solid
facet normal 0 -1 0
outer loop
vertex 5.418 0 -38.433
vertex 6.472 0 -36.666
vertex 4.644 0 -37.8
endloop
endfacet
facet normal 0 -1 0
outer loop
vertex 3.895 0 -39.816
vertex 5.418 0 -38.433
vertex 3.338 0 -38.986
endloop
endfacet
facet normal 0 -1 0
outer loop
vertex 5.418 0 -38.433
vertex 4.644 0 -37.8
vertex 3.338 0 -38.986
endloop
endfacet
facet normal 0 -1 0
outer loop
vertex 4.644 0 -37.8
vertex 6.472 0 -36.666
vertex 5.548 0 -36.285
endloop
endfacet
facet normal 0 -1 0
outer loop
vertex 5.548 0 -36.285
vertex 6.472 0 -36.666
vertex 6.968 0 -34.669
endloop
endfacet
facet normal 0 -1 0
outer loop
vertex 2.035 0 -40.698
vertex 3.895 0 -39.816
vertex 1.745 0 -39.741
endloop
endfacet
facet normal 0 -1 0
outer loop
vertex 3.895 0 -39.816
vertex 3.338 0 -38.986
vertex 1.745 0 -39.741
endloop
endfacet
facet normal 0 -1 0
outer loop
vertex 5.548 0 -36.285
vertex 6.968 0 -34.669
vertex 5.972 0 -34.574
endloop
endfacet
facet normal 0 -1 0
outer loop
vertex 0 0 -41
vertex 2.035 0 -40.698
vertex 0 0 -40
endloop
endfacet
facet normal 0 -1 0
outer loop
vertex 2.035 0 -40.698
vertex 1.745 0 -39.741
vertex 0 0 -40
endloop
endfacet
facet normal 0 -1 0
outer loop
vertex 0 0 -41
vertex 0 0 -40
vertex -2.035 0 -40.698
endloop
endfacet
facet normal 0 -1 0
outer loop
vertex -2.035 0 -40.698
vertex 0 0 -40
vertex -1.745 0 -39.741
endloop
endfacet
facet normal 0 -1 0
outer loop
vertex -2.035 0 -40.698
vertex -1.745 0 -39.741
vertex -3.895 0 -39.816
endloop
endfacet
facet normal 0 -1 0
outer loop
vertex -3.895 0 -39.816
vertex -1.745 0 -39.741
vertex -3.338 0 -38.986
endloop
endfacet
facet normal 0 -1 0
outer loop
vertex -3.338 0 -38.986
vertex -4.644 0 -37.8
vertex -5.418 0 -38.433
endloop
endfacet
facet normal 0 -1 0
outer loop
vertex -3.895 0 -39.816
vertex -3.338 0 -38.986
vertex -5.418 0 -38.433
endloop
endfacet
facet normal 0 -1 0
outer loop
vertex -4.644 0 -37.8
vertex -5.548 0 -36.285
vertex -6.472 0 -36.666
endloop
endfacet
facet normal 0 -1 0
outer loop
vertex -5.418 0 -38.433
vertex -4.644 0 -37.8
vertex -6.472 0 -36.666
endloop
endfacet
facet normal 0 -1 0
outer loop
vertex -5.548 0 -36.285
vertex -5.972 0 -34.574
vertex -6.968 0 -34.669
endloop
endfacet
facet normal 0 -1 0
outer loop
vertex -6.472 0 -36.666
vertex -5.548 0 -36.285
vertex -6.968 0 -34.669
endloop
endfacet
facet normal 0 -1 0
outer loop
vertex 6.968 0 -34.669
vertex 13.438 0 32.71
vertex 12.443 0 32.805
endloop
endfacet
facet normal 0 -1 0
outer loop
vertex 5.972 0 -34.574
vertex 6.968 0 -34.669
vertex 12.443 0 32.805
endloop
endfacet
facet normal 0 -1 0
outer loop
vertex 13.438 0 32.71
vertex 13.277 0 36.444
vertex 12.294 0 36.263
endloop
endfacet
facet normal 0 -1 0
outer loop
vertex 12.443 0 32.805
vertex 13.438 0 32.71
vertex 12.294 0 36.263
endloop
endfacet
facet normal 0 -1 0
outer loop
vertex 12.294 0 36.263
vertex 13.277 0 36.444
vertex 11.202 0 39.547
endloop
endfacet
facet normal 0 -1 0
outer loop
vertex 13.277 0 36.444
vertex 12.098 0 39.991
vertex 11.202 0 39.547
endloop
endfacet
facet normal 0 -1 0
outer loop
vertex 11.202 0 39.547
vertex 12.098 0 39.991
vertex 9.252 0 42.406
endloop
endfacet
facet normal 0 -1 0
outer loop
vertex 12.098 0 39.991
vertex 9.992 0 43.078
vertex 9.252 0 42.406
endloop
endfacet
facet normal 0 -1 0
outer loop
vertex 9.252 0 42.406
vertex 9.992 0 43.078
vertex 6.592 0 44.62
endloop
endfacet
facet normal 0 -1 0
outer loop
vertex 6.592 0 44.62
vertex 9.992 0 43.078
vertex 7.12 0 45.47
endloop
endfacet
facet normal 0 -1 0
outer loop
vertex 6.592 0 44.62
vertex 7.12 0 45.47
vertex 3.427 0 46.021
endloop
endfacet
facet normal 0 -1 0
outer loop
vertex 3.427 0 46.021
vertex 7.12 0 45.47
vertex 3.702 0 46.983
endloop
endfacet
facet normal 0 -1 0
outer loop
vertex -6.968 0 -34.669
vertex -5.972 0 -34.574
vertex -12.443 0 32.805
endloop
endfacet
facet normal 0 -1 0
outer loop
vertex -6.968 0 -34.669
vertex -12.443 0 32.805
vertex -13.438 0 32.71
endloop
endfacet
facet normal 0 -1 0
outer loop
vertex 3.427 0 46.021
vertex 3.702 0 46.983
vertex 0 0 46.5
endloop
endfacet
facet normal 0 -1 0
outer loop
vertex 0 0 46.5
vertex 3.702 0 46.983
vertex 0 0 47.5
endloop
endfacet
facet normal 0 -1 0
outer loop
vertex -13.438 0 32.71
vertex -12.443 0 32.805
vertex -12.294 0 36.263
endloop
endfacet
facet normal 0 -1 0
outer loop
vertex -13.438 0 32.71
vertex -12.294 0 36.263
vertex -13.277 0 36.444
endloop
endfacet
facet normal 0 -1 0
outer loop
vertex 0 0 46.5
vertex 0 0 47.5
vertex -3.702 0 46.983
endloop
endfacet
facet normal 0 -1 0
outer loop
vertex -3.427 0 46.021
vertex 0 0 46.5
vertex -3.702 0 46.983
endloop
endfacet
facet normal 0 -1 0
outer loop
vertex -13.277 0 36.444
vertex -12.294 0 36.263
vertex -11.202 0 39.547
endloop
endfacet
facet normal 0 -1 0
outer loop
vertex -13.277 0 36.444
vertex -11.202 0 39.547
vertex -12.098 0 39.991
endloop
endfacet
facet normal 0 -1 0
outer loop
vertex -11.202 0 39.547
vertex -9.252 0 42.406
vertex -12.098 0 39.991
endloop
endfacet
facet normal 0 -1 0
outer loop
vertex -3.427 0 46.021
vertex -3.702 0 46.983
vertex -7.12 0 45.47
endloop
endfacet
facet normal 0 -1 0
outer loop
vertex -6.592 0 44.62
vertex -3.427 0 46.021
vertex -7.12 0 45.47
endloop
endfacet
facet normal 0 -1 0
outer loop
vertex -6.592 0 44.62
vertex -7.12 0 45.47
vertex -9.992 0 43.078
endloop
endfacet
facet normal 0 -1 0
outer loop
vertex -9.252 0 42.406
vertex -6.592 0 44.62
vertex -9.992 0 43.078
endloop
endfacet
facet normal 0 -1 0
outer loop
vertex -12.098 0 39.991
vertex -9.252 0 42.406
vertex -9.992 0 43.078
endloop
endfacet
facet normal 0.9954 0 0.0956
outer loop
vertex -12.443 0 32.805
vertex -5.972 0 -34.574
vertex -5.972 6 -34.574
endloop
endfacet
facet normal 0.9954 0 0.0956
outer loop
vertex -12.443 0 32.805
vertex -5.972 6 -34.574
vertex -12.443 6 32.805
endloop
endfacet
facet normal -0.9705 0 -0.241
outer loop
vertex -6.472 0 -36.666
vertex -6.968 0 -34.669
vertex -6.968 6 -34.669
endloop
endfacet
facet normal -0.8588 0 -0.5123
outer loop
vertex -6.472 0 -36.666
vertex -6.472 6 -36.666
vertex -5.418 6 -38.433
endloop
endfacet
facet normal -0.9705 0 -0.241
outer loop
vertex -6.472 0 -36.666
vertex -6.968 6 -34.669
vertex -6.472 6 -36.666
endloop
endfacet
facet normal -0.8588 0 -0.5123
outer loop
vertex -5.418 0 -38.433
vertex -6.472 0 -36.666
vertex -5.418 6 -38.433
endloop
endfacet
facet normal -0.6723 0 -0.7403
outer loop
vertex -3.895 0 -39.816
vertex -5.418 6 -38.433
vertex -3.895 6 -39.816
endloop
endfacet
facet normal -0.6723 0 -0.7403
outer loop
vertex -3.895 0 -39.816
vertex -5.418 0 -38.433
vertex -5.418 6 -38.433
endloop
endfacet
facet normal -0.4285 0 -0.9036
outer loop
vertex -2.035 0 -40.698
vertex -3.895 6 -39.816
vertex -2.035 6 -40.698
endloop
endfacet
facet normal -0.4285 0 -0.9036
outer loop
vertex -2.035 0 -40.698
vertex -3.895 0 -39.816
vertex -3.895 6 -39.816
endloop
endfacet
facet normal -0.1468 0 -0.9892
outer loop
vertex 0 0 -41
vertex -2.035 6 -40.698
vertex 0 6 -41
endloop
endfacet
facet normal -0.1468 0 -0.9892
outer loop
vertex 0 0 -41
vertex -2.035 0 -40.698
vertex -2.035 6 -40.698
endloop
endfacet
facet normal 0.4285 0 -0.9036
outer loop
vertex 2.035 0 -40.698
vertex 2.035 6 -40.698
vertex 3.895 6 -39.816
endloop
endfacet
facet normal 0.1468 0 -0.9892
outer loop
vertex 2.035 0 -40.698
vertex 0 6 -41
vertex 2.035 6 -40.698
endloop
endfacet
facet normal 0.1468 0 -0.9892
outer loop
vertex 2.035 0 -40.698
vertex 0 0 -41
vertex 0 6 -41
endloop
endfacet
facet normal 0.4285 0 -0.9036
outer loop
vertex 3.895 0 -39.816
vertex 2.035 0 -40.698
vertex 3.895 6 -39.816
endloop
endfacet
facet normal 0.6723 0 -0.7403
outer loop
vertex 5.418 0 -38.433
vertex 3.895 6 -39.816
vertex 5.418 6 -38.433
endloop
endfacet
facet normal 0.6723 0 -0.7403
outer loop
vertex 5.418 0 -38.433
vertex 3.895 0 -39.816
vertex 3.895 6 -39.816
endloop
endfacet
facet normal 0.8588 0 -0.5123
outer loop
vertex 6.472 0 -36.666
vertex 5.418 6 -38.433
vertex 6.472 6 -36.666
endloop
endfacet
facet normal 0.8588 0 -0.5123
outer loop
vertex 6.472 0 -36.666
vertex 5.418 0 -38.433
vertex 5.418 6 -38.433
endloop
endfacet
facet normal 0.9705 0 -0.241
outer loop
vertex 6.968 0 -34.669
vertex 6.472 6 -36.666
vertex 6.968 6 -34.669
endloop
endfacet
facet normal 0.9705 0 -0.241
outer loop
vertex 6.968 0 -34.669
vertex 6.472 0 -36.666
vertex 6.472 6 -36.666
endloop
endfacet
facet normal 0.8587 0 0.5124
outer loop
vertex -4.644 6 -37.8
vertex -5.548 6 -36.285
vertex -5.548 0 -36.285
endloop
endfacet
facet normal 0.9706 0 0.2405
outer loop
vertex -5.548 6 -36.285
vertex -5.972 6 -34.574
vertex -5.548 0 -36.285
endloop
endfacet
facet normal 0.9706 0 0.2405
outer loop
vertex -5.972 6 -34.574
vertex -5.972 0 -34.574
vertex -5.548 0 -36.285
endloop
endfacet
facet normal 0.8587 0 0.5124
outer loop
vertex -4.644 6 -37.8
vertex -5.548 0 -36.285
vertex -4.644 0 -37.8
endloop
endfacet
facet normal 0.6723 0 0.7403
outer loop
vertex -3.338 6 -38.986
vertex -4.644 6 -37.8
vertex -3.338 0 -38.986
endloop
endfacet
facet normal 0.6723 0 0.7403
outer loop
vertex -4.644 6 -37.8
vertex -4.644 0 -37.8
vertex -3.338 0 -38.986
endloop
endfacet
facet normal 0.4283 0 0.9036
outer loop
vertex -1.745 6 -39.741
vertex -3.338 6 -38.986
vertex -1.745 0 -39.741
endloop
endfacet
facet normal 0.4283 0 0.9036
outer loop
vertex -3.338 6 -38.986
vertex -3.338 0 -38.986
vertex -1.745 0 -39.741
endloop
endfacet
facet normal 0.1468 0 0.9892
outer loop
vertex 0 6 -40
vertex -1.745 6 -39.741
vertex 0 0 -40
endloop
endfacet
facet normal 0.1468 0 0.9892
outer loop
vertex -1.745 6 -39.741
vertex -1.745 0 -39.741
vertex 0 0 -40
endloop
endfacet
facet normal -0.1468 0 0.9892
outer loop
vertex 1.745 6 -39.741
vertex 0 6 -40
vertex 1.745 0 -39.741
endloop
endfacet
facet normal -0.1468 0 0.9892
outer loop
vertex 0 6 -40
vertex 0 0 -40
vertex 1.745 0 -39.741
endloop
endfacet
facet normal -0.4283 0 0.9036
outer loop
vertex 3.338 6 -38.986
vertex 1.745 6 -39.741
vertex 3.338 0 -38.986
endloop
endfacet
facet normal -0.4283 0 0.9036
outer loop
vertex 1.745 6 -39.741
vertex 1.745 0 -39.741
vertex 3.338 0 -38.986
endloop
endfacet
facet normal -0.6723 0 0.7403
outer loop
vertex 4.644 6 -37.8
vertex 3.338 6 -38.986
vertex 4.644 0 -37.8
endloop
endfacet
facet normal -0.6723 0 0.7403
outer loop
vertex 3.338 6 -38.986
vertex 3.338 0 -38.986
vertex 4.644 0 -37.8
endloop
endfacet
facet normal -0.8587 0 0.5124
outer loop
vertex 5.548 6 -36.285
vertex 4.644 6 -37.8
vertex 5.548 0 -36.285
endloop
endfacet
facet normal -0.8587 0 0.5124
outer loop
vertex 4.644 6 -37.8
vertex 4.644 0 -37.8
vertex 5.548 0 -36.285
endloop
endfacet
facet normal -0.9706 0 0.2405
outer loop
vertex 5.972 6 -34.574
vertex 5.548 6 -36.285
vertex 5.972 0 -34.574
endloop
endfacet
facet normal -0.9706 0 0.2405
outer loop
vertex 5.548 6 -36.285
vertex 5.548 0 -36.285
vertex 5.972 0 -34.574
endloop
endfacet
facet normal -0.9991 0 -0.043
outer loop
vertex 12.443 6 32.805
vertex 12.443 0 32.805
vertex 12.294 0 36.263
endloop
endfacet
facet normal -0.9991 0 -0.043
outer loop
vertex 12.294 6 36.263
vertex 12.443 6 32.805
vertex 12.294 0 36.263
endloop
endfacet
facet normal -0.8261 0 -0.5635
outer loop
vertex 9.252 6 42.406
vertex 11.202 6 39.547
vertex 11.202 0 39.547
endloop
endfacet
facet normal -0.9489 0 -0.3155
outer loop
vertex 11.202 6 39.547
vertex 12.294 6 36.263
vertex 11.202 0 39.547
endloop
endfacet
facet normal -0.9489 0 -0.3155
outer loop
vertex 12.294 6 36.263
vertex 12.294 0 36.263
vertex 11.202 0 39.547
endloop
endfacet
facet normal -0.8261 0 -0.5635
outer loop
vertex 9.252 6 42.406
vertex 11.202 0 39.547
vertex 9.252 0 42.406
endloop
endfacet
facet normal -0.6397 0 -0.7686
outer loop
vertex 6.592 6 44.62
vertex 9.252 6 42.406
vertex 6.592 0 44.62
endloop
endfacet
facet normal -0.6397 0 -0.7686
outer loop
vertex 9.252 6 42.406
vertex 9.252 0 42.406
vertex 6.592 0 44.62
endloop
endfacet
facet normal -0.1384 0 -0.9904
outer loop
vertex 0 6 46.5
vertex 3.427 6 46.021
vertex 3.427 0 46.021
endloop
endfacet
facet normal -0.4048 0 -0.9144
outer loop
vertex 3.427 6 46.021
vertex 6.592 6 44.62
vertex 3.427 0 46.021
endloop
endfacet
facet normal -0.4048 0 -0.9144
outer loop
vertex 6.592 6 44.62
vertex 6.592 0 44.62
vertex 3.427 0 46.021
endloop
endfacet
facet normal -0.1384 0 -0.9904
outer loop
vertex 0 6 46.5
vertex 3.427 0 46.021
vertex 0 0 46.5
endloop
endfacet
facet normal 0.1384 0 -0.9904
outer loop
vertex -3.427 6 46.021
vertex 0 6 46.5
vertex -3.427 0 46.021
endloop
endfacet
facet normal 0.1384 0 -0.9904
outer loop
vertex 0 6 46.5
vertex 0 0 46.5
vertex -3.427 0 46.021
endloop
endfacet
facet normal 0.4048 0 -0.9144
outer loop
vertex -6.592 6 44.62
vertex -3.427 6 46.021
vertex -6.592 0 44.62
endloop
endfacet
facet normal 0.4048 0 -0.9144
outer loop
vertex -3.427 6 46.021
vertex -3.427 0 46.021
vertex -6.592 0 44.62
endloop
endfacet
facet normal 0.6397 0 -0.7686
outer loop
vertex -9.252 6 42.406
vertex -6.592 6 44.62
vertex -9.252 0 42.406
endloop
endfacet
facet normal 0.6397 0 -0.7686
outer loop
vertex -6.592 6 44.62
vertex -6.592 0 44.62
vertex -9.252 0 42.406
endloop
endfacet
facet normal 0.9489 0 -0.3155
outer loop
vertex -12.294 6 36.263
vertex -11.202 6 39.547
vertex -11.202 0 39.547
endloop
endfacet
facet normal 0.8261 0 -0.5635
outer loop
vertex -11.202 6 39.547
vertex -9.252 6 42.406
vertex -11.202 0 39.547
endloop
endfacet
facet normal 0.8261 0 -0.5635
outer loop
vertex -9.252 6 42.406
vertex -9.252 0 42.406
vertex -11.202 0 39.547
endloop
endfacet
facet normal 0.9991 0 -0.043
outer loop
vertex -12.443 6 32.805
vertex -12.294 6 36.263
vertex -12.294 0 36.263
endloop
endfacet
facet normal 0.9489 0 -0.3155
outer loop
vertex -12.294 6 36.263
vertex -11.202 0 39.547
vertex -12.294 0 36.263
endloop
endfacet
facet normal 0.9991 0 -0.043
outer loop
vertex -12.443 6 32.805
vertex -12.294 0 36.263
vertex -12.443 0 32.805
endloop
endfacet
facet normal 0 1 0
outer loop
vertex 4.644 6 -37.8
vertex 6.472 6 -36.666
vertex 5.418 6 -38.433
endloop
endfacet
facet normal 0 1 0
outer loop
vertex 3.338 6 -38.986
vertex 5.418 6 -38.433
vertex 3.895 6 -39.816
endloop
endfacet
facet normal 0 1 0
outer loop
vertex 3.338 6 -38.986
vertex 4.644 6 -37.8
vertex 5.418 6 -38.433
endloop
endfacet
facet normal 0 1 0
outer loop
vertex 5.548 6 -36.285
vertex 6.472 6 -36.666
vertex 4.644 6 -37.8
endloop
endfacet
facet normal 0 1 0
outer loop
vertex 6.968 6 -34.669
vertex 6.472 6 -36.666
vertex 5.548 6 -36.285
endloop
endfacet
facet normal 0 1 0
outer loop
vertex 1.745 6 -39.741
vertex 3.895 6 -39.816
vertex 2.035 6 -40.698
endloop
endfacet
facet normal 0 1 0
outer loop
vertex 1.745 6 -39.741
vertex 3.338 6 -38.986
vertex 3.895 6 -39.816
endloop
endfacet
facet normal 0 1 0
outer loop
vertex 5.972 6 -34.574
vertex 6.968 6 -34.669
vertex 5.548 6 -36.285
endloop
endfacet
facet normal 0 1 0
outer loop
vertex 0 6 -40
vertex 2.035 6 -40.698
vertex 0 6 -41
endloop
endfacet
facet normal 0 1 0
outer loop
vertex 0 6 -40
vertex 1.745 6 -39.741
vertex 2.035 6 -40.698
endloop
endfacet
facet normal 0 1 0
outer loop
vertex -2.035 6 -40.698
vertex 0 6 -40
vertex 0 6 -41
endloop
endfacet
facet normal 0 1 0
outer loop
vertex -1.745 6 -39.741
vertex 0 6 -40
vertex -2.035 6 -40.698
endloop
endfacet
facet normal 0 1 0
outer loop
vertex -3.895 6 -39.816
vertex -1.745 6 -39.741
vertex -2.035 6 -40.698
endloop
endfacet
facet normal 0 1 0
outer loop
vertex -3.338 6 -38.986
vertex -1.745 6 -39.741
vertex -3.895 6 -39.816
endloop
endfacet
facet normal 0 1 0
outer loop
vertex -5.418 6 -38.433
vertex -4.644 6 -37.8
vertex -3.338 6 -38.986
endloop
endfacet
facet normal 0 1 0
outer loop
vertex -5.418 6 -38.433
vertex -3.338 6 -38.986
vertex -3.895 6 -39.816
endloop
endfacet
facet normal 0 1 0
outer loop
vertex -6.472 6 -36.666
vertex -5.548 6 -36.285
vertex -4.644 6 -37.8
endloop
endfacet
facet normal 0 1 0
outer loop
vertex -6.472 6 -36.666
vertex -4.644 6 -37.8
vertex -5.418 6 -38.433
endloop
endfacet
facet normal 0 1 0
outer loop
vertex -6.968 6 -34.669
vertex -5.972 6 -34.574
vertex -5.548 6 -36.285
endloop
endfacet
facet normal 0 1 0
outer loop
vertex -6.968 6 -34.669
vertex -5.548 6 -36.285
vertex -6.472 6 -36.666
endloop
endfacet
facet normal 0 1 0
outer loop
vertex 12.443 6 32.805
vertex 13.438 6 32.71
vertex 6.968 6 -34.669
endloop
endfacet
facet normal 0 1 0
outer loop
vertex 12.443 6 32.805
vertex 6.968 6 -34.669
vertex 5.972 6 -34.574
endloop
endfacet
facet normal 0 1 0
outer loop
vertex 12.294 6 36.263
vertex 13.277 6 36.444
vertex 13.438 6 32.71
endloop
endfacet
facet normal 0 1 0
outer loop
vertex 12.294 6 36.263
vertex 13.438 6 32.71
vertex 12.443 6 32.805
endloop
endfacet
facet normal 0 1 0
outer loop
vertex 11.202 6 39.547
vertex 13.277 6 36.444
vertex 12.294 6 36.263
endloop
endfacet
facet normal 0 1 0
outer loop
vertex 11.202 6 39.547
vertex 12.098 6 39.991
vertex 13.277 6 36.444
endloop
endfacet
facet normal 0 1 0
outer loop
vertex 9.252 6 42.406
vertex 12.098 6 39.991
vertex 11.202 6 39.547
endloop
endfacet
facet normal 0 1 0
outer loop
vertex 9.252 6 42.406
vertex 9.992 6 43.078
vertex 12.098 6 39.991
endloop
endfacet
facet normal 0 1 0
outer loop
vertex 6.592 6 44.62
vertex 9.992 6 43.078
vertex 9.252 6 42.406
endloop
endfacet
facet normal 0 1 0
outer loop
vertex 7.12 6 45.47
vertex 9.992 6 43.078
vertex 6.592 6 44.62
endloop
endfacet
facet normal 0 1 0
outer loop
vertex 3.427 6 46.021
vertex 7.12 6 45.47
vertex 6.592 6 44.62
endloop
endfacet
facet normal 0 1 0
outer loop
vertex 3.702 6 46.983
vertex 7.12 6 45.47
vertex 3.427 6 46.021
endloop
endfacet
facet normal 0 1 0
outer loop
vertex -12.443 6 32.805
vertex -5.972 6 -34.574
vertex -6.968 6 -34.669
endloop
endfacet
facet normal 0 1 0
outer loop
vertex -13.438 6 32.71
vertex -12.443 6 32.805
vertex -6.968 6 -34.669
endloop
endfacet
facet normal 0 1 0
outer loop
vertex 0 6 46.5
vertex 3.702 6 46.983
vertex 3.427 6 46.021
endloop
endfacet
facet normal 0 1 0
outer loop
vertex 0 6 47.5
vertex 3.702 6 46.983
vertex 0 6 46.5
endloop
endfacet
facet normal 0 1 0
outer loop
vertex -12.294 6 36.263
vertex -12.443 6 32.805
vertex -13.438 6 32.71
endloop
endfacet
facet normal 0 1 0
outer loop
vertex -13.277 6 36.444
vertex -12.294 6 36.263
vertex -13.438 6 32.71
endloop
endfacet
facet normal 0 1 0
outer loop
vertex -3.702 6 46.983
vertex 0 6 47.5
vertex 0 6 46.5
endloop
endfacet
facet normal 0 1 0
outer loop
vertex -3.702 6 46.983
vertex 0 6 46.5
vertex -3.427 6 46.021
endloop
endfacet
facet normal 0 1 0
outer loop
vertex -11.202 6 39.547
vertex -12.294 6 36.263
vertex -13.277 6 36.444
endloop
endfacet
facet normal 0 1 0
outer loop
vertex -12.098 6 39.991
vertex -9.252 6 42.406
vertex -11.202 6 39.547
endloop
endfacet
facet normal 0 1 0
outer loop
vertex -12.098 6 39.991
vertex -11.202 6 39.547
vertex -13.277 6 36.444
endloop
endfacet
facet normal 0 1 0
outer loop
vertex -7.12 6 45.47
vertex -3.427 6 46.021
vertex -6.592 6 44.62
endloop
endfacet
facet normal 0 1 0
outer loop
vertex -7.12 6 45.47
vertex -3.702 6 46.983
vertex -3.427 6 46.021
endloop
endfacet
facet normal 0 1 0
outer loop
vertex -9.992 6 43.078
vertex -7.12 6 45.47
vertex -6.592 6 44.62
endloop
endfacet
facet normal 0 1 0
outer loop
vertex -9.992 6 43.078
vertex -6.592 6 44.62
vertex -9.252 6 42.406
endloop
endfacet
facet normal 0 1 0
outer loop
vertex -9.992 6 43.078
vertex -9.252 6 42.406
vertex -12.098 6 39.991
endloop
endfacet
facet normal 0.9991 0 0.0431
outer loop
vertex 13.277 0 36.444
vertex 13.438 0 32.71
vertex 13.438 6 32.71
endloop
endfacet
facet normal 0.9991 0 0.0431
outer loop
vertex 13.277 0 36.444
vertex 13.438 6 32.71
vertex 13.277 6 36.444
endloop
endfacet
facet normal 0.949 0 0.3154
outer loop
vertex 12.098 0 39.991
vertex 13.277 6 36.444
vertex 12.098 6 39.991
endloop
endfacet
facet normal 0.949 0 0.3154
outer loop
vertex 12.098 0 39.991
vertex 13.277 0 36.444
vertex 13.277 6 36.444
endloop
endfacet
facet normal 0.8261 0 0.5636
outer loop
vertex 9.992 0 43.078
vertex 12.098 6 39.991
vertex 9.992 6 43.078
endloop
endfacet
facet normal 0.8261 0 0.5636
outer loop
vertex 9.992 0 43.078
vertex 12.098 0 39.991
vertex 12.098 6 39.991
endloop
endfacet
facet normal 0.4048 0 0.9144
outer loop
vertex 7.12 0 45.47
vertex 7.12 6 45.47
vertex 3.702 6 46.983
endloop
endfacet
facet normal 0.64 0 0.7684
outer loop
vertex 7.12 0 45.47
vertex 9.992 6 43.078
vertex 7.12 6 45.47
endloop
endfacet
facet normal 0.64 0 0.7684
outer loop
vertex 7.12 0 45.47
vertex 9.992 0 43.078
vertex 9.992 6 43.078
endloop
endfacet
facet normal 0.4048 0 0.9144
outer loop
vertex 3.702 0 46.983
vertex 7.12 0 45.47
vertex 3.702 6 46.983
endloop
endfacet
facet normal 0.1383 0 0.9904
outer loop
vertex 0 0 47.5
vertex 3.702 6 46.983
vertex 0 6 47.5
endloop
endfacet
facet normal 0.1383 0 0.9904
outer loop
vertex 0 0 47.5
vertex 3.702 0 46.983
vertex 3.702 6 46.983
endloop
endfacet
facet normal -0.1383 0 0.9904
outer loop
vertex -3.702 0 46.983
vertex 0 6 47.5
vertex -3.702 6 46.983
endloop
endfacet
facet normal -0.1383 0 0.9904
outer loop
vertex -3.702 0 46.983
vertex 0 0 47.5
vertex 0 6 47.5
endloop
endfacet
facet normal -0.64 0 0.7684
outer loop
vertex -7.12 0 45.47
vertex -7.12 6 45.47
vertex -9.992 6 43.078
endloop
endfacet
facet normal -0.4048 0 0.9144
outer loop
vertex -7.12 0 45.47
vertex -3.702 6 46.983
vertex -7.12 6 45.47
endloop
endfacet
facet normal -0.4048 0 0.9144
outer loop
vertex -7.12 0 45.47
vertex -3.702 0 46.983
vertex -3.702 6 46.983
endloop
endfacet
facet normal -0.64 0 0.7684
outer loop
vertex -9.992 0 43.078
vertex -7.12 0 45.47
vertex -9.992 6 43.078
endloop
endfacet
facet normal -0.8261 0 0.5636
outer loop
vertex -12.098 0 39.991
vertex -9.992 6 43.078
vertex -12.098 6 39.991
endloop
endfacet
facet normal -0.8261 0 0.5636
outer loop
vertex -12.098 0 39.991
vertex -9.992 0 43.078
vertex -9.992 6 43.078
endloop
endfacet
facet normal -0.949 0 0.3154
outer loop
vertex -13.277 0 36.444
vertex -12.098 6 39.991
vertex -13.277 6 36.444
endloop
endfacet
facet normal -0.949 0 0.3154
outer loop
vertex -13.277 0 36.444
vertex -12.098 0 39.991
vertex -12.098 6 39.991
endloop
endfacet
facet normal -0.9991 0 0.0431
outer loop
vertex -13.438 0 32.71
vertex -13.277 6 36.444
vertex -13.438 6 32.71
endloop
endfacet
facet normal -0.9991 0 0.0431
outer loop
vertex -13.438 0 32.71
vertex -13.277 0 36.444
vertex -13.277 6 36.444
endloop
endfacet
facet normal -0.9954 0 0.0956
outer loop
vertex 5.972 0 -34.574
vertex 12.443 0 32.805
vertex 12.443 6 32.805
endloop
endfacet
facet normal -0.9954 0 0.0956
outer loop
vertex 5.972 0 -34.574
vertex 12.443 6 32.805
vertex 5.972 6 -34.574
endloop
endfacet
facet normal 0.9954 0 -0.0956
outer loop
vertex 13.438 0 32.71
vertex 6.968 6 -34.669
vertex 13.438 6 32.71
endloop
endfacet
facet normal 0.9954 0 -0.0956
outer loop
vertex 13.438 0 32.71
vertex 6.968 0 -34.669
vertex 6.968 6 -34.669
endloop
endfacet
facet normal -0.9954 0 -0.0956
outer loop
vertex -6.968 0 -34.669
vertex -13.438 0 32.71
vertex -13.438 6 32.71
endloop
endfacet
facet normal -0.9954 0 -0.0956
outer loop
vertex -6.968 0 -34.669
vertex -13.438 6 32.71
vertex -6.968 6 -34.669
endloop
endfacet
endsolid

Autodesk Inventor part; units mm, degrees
ref_plane "YZ Plane" through (0, 0, 0) normal (1, 0, 0) x (0, 1, 0)
ref_plane "XZ Plane" through (0, 0, 0) normal (0, 1, 0) x (-1, 0, 0)
ref_plane "XY Plane" through (0, 0, 0) normal (0, 0, 1) x (1, 0, 0)
sketch "Sketch1" plane through (0, 0, 0) normal (0, 1, 0) x (-1, 0, 0)
  line L0 (0, -23.2452) -> (0, 23.2452) construction
  line L1 (0, -34) -> (0, 34) construction
  arc A0 (12.4428, 32.8051) -> (-12.4428, 32.8051) centre (0, 34) ccw
  arc A1 (-5.9725, -34.5735) -> (5.9725, -34.5735) centre (0, -34) ccw
  line L2 (-12.4428, 32.8051) -> (-5.9725, -34.5735)
  line L3 (5.9725, -34.5735) -> (12.4428, 32.8051)
  arc A2 (13.4382, 32.7096) -> (-13.4382, 32.7096) centre (0, 34) ccw
  line L4 (13.4382, 32.7096) -> (6.9679, -34.6691)
  arc A3 (-6.9679, -34.6691) -> (6.9679, -34.6691) centre (0, -34) ccw
  line L5 (-6.9679, -34.6691) -> (-13.4382, 32.7096)
  point P0 (0, 0)
  dimension "d5" = 25
  dimension "d6" = 12
  dimension "d7" = 68
  dimension "d8" = 1
extrude "Extrusion1" add sketch "Sketch1" along normal blind 6
properties part number "Z Axis Belt" material "Rubber"
